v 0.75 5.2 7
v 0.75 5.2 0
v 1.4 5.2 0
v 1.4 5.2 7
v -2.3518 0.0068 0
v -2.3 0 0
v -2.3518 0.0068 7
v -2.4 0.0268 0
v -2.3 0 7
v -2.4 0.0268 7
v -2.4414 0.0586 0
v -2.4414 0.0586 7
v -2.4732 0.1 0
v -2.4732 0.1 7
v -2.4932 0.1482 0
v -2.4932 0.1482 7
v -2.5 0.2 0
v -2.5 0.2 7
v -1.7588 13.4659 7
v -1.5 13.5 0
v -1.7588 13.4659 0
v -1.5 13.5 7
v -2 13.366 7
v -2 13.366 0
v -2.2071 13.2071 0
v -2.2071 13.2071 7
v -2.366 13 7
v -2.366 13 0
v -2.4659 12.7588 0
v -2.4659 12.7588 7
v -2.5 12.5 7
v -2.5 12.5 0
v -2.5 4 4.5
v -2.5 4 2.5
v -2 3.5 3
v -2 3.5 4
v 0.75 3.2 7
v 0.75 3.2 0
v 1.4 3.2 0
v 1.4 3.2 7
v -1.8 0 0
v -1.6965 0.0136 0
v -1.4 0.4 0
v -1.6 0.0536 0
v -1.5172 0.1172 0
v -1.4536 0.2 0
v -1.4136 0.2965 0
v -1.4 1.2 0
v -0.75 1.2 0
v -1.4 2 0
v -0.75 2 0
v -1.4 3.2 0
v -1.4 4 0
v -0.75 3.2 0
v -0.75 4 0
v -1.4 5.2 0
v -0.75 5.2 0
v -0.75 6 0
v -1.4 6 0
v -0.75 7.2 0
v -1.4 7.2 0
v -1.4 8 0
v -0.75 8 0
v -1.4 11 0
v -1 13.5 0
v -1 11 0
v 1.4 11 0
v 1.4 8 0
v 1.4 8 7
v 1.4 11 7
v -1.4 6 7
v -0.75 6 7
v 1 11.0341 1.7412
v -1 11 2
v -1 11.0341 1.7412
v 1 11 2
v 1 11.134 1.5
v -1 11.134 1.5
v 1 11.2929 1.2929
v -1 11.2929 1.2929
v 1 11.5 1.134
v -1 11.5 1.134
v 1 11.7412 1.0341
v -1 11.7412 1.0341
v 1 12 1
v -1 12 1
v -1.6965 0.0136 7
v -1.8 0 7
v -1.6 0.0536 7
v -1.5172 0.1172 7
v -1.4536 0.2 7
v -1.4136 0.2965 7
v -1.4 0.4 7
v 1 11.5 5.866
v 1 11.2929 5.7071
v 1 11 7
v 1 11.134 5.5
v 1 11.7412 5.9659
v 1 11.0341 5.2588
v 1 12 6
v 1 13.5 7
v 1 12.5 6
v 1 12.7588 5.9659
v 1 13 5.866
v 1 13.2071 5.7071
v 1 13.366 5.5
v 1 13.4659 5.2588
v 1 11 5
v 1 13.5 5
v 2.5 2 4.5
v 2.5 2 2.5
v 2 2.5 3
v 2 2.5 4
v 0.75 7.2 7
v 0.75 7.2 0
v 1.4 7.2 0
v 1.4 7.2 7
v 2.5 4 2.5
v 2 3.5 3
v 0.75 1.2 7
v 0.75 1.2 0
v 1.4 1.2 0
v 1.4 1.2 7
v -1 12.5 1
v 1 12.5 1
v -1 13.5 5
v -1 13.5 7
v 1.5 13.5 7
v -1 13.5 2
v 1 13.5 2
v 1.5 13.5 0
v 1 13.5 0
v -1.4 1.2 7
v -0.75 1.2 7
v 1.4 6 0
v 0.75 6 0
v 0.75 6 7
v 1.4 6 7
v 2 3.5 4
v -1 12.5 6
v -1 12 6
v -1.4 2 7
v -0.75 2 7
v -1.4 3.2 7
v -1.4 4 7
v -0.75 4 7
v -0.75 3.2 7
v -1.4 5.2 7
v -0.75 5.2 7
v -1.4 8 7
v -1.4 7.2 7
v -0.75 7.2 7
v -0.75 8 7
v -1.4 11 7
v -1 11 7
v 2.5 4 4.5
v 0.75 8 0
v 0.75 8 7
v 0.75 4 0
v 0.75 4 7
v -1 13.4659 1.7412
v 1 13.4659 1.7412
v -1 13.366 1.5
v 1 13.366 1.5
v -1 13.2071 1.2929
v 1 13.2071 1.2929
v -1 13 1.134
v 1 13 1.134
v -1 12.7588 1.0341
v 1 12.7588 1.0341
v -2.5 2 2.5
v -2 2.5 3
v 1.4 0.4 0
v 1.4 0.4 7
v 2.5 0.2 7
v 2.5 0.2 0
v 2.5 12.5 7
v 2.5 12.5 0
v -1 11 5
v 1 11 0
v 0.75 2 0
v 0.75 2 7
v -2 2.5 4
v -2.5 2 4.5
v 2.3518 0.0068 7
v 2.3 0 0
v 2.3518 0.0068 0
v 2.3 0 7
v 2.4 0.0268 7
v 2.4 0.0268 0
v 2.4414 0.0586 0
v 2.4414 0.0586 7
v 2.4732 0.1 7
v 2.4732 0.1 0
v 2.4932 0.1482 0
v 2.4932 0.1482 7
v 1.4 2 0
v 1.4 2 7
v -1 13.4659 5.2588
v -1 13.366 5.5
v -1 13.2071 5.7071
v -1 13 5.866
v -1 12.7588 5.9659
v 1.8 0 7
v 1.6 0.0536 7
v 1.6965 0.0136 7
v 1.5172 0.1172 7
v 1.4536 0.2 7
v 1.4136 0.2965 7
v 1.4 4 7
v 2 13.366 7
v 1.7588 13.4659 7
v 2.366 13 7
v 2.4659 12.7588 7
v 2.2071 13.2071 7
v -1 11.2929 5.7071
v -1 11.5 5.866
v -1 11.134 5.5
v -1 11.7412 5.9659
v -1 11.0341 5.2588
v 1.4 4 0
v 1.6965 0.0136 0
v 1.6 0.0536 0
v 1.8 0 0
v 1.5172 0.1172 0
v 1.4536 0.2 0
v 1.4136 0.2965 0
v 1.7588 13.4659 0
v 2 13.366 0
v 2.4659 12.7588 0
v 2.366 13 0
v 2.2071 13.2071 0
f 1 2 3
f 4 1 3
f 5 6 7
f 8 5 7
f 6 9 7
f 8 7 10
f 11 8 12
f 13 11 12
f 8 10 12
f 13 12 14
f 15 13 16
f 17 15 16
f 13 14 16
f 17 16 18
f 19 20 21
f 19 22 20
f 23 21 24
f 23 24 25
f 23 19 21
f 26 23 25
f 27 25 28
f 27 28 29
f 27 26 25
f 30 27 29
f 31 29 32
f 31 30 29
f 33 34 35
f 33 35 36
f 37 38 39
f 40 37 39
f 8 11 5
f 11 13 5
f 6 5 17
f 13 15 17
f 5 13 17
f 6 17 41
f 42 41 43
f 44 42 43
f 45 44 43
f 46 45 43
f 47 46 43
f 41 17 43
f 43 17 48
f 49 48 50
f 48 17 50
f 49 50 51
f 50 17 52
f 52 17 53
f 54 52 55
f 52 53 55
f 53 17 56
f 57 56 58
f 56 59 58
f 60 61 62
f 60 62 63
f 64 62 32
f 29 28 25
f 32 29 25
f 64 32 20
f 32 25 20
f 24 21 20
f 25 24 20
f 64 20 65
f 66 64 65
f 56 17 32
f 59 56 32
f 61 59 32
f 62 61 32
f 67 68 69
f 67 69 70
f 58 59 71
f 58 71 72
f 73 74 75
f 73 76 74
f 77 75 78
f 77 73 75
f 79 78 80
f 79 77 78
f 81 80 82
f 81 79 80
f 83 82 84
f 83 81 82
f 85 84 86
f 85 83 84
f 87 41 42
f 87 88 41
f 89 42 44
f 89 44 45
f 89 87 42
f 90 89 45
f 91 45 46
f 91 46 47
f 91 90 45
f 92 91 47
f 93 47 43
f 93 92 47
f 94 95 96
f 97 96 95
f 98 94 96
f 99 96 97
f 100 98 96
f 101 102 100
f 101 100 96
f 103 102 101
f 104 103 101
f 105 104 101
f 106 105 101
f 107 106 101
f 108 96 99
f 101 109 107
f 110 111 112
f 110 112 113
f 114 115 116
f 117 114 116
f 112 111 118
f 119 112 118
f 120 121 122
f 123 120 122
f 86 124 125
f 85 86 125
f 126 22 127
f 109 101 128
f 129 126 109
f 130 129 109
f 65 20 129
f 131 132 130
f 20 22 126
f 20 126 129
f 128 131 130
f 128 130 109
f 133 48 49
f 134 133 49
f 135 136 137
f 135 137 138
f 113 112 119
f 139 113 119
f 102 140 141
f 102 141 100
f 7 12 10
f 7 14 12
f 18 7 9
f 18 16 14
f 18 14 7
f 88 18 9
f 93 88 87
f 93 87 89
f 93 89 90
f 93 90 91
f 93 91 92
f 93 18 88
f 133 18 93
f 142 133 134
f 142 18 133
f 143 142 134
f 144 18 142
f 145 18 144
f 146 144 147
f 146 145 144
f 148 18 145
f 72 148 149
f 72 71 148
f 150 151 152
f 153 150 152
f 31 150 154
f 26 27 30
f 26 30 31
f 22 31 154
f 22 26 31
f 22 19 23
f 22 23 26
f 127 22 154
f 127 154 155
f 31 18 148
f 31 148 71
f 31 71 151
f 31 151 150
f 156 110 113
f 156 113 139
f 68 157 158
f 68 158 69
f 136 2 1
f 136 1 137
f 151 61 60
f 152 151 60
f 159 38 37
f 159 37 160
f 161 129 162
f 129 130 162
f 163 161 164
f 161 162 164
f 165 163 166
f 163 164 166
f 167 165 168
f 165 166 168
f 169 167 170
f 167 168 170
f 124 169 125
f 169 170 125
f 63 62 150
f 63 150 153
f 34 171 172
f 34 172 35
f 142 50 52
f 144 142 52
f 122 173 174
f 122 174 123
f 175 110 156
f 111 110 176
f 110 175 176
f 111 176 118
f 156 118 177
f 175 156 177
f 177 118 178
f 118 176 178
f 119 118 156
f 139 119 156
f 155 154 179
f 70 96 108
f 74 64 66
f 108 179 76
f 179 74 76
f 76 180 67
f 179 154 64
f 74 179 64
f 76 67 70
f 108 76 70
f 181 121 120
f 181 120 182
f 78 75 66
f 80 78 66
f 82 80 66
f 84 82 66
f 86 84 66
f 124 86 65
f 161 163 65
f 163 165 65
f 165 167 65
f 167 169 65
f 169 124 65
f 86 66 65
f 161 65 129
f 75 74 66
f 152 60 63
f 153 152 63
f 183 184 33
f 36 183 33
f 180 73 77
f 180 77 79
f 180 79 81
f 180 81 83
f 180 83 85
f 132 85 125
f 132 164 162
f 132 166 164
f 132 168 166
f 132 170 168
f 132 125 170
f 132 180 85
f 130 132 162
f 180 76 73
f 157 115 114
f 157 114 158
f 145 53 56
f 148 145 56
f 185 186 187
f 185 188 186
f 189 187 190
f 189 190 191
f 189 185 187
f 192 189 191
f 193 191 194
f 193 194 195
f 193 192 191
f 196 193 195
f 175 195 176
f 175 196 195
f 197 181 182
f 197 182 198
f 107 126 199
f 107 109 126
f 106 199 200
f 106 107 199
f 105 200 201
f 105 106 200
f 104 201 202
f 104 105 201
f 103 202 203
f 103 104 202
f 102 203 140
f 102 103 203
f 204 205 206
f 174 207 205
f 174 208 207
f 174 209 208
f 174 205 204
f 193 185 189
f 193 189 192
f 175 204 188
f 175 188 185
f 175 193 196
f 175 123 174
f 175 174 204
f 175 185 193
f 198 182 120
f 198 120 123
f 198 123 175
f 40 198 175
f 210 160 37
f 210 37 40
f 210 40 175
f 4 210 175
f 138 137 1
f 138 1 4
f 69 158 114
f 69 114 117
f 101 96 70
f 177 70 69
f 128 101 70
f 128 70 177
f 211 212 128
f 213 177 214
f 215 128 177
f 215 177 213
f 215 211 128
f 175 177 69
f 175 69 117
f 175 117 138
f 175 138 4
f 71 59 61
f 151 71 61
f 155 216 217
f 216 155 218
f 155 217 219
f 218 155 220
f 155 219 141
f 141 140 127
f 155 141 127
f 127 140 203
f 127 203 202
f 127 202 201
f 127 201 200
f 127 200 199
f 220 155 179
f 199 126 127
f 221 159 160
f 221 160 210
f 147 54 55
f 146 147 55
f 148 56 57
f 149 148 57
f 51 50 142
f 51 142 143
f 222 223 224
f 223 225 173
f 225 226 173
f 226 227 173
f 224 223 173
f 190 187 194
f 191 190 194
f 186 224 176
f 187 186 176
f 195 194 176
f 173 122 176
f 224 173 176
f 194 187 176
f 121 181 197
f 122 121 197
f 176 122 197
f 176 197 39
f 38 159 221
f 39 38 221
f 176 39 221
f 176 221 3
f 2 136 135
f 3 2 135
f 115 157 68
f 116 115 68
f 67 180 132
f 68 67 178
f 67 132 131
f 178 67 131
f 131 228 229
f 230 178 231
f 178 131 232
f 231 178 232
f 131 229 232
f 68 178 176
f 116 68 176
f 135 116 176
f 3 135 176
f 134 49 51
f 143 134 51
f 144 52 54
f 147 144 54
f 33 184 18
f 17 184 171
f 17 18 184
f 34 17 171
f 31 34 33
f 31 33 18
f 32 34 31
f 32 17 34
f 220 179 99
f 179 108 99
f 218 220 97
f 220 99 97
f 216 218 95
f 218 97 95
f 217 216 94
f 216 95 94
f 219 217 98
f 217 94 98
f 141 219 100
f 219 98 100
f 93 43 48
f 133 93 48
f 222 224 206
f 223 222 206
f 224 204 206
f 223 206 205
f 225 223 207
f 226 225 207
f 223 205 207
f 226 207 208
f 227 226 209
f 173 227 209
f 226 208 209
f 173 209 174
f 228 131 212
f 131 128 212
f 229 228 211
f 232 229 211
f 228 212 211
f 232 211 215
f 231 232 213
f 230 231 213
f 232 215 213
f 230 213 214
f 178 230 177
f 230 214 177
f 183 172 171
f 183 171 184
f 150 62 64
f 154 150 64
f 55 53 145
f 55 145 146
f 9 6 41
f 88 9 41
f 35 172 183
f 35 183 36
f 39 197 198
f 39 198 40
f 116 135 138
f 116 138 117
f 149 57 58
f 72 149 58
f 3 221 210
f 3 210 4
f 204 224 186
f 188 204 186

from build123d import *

# Parameters (mm, degrees)
BOX013_W     = 1
BOX013_H     = 2
BOX013_DEPTH = 2
BOX012_W     = 1
BOX012_H     = 2
BOX012_DEPTH = 2
CHAMFER_SIZE = 0.5
BOX007_W     = 2
BOX007_H     = 2.5
BOX007_DEPTH = 1
BOX008_W     = 2
BOX008_H     = 2.5
BOX008_DEPTH = 1
BOX_W        = 1.5
BOX_H        = 10
BOX_DEPTH    = 7
BOX001_W     = 2.8
BOX001_H     = 1.2
BOX001_DEPTH = 7
BOX002_W     = 2.8
BOX002_H     = 1.2
BOX002_DEPTH = 7
BOX003_W     = 2.8
BOX003_H     = 1.2
BOX003_DEPTH = 7
BOX004_W     = 2.8
BOX004_H     = 1.2
BOX004_DEPTH = 7
BOX005_W     = 2.8
BOX005_H     = 3
BOX005_DEPTH = 7
BOX006_W     = 5
BOX006_H     = 13.5
BOX006_DEPTH = 7
FILLET_R     = 1
FILLET007_R  = 1
FILLET008_R  = 0.4
FILLET009_R  = 0.2


with BuildPart() as cube013:
    # Box013 → Box013 (new body)
    with BuildSketch(Plane(origin=(-3, 2, 2.5), x_dir=(1, 0, 0), z_dir=(0, 0, 1))):
        with Locations((0.5, 1)):
            Rectangle(BOX013_W, BOX013_H)
    extrude(amount=BOX013_DEPTH)


with BuildPart() as chamfer_body:
    # Box012 → Box012 (new body)
    with BuildSketch(Plane(origin=(2, 2, 2.5), x_dir=(1, 0, 0), z_dir=(0, 0, 1))):
        with Locations((0.5, 1)):
            Rectangle(BOX012_W, BOX012_H)
    extrude(amount=BOX012_DEPTH)

    # Fusion005: union Cube013
    add(cube013.part)

    # Chamfer
    chamfer_edges = [chamfer_body.edges().sort_by_distance(p)[0] for p in [
        (2, 2, 3.5),
        (2, 3, 4.5),
        (2, 4, 3.5),
        (2, 3, 2.5),
        (-2, 2, 3.5),
        (-2, 3, 4.5),
        (-2, 4, 3.5),
        (-2, 3, 2.5),
    ]]
    chamfer(chamfer_edges, length=CHAMFER_SIZE)


with BuildPart() as cube007:
    # Box007 → Box007 (new body)
    with BuildSketch(Plane(origin=(-1, 11, 0), x_dir=(1, 0, 0), z_dir=(0, 0, 1))):
        with Locations((1, 1.25)):
            Rectangle(BOX007_W, BOX007_H)
    extrude(amount=BOX007_DEPTH)


with BuildPart() as fusion001:
    # Box008 → Box008 (new body)
    with BuildSketch(Plane(origin=(-1, 11, 6), x_dir=(1, 0, 0), z_dir=(0, 0, 1))):
        with Locations((1, 1.25)):
            Rectangle(BOX008_W, BOX008_H)
    extrude(amount=BOX008_DEPTH)

    # Fusion001: union Cube007
    add(cube007.part)


with BuildPart() as cube:
    # Box → Box (new body)
    with BuildSketch(Plane(origin=(-0.75, 0, 0), x_dir=(1, 0, 0), z_dir=(0, 0, 1))):
        with Locations((0.75, 5)):
            Rectangle(BOX_W, BOX_H)
    extrude(amount=BOX_DEPTH)


with BuildPart() as cube001:
    # Box001 → Box001 (new body)
    with BuildSketch(Plane(origin=(-1.4, 0, 0), x_dir=(1, 0, 0), z_dir=(0, 0, 1))):
        with Locations((1.4, 0.6)):
            Rectangle(BOX001_W, BOX001_H)
    extrude(amount=BOX001_DEPTH)


with BuildPart() as cube002:
    # Box002 → Box002 (new body)
    with BuildSketch(Plane(origin=(-1.4, 2, 0), x_dir=(1, 0, 0), z_dir=(0, 0, 1))):
        with Locations((1.4, 0.6)):
            Rectangle(BOX002_W, BOX002_H)
    extrude(amount=BOX002_DEPTH)


with BuildPart() as cube003:
    # Box003 → Box003 (new body)
    with BuildSketch(Plane(origin=(-1.4, 4, 0), x_dir=(1, 0, 0), z_dir=(0, 0, 1))):
        with Locations((1.4, 0.6)):
            Rectangle(BOX003_W, BOX003_H)
    extrude(amount=BOX003_DEPTH)


with BuildPart() as cube004:
    # Box004 → Box004 (new body)
    with BuildSketch(Plane(origin=(-1.4, 6, 0), x_dir=(1, 0, 0), z_dir=(0, 0, 1))):
        with Locations((1.4, 0.6)):
            Rectangle(BOX004_W, BOX004_H)
    extrude(amount=BOX004_DEPTH)


with BuildPart() as fusion:
    # Box005 → Box005 (new body)
    with BuildSketch(Plane(origin=(-1.4, 8, 0), x_dir=(1, 0, 0), z_dir=(0, 0, 1))):
        with Locations((1.4, 1.5)):
            Rectangle(BOX005_W, BOX005_H)
    extrude(amount=BOX005_DEPTH)

    # Fusion: union Cube, Cube001, Cube002, Cube003, Cube004
    add(cube.part)
    add(cube001.part)
    add(cube002.part)
    add(cube003.part)
    add(cube004.part)


with BuildPart() as fillet009:
    # Box006 → Box006 (new body)
    with BuildSketch(Plane(origin=(-2.5, 0, 0), x_dir=(1, 0, 0), z_dir=(0, 0, 1))):
        with Locations((2.5, 6.75)):
            Rectangle(BOX006_W, BOX006_H)
    extrude(amount=BOX006_DEPTH)

    # Cut: cut Fusion
    add(fusion.part, mode=Mode.SUBTRACT)

    # Cut004: cut Fusion001
    add(fusion001.part, mode=Mode.SUBTRACT)

    # Cut005: cut Chamfer body
    add(chamfer_body.part, mode=Mode.SUBTRACT)

    # Fillet
    fillet_edges = [fillet009.edges().sort_by_distance(p)[0] for p in [
        (0, 13.5, 1),
        (0, 13.5, 6),
        (0, 11, 1),
        (0, 11, 6),
    ]]
    fillet(fillet_edges, radius=FILLET_R)

    # Fillet007
    fillet007_edges = [fillet009.edges().sort_by_distance(p)[0] for p in [
        (-2.5, 13.5, 3.5),
        (2.5, 13.5, 3.5),
    ]]
    fillet(fillet007_edges, radius=FILLET007_R)

    # Fillet008
    fillet008_edges = [fillet009.edges().sort_by_distance(p)[0] for p in [
        (-1.4, 0, 3.5),
        (1.4, 0, 3.5),
    ]]
    fillet(fillet008_edges, radius=FILLET008_R)

    # Fillet009
    fillet009_edges = [fillet009.edges().sort_by_distance(p)[0] for p in [
        (-2.5, 0, 3.5),
        (2.5, 0, 3.5),
    ]]
    fillet(fillet009_edges, radius=FILLET009_R)


solid = fillet009.part
